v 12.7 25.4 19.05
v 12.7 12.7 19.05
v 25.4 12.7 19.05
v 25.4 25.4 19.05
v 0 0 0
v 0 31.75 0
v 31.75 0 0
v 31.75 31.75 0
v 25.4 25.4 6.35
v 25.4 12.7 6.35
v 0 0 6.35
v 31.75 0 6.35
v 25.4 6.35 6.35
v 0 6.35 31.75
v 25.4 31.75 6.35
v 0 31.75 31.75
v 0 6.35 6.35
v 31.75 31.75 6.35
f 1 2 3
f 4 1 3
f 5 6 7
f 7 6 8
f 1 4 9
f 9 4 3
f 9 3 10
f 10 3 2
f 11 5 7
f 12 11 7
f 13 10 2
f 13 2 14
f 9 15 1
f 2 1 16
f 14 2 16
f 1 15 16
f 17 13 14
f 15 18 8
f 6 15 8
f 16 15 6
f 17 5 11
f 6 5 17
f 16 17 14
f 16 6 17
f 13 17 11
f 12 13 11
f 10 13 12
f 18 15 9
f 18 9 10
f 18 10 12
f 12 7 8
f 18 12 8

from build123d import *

# Parameters (mm, degrees)
F0_W     = 31.75
F0_H     = 31.75
F1_DEPTH = 6.35
F3_DEPTH = 25.4
F5_DEPTH = 19.05
F7_DEPTH = 6.35


with BuildPart() as f1:
    # F0 (on Top) → F1 (new body)
    with BuildSketch(Plane.XY):
        with Locations((15.875, 15.875)):
            Rectangle(F0_W, F0_H)
    extrude(amount=F1_DEPTH)

    # F2 (on face) → F3 (join)
    with BuildSketch(Plane(origin=(0, 31.75, 0), x_dir=(-1, 0, 0), z_dir=(0, 1, 0))):
        Polygon((-25.4, 6.35), (0, 6.35), (0, 31.75), align=None)
    extrude(amount=-F3_DEPTH)

    # F4 (on face) → F5 (join)
    with BuildSketch(Plane(origin=(0, 31.75, 0), x_dir=(-1, 0, 0), z_dir=(0, 1, 0))):
        Polygon((-25.4, 19.05), (-25.4, 6.35), (-12.7, 19.05), align=None)
    extrude(amount=-F5_DEPTH)

    # F6 (on face) → F7 (cut)
    with BuildSketch(Plane(origin=(0, 31.75, 0), x_dir=(-1, 0, 0), z_dir=(0, 1, 0))):
        Polygon((-25.4, 19.05), (-25.4, 6.35), (-12.7, 19.05), align=None)
    extrude(amount=-F7_DEPTH, mode=Mode.SUBTRACT)


solid = f1.part
